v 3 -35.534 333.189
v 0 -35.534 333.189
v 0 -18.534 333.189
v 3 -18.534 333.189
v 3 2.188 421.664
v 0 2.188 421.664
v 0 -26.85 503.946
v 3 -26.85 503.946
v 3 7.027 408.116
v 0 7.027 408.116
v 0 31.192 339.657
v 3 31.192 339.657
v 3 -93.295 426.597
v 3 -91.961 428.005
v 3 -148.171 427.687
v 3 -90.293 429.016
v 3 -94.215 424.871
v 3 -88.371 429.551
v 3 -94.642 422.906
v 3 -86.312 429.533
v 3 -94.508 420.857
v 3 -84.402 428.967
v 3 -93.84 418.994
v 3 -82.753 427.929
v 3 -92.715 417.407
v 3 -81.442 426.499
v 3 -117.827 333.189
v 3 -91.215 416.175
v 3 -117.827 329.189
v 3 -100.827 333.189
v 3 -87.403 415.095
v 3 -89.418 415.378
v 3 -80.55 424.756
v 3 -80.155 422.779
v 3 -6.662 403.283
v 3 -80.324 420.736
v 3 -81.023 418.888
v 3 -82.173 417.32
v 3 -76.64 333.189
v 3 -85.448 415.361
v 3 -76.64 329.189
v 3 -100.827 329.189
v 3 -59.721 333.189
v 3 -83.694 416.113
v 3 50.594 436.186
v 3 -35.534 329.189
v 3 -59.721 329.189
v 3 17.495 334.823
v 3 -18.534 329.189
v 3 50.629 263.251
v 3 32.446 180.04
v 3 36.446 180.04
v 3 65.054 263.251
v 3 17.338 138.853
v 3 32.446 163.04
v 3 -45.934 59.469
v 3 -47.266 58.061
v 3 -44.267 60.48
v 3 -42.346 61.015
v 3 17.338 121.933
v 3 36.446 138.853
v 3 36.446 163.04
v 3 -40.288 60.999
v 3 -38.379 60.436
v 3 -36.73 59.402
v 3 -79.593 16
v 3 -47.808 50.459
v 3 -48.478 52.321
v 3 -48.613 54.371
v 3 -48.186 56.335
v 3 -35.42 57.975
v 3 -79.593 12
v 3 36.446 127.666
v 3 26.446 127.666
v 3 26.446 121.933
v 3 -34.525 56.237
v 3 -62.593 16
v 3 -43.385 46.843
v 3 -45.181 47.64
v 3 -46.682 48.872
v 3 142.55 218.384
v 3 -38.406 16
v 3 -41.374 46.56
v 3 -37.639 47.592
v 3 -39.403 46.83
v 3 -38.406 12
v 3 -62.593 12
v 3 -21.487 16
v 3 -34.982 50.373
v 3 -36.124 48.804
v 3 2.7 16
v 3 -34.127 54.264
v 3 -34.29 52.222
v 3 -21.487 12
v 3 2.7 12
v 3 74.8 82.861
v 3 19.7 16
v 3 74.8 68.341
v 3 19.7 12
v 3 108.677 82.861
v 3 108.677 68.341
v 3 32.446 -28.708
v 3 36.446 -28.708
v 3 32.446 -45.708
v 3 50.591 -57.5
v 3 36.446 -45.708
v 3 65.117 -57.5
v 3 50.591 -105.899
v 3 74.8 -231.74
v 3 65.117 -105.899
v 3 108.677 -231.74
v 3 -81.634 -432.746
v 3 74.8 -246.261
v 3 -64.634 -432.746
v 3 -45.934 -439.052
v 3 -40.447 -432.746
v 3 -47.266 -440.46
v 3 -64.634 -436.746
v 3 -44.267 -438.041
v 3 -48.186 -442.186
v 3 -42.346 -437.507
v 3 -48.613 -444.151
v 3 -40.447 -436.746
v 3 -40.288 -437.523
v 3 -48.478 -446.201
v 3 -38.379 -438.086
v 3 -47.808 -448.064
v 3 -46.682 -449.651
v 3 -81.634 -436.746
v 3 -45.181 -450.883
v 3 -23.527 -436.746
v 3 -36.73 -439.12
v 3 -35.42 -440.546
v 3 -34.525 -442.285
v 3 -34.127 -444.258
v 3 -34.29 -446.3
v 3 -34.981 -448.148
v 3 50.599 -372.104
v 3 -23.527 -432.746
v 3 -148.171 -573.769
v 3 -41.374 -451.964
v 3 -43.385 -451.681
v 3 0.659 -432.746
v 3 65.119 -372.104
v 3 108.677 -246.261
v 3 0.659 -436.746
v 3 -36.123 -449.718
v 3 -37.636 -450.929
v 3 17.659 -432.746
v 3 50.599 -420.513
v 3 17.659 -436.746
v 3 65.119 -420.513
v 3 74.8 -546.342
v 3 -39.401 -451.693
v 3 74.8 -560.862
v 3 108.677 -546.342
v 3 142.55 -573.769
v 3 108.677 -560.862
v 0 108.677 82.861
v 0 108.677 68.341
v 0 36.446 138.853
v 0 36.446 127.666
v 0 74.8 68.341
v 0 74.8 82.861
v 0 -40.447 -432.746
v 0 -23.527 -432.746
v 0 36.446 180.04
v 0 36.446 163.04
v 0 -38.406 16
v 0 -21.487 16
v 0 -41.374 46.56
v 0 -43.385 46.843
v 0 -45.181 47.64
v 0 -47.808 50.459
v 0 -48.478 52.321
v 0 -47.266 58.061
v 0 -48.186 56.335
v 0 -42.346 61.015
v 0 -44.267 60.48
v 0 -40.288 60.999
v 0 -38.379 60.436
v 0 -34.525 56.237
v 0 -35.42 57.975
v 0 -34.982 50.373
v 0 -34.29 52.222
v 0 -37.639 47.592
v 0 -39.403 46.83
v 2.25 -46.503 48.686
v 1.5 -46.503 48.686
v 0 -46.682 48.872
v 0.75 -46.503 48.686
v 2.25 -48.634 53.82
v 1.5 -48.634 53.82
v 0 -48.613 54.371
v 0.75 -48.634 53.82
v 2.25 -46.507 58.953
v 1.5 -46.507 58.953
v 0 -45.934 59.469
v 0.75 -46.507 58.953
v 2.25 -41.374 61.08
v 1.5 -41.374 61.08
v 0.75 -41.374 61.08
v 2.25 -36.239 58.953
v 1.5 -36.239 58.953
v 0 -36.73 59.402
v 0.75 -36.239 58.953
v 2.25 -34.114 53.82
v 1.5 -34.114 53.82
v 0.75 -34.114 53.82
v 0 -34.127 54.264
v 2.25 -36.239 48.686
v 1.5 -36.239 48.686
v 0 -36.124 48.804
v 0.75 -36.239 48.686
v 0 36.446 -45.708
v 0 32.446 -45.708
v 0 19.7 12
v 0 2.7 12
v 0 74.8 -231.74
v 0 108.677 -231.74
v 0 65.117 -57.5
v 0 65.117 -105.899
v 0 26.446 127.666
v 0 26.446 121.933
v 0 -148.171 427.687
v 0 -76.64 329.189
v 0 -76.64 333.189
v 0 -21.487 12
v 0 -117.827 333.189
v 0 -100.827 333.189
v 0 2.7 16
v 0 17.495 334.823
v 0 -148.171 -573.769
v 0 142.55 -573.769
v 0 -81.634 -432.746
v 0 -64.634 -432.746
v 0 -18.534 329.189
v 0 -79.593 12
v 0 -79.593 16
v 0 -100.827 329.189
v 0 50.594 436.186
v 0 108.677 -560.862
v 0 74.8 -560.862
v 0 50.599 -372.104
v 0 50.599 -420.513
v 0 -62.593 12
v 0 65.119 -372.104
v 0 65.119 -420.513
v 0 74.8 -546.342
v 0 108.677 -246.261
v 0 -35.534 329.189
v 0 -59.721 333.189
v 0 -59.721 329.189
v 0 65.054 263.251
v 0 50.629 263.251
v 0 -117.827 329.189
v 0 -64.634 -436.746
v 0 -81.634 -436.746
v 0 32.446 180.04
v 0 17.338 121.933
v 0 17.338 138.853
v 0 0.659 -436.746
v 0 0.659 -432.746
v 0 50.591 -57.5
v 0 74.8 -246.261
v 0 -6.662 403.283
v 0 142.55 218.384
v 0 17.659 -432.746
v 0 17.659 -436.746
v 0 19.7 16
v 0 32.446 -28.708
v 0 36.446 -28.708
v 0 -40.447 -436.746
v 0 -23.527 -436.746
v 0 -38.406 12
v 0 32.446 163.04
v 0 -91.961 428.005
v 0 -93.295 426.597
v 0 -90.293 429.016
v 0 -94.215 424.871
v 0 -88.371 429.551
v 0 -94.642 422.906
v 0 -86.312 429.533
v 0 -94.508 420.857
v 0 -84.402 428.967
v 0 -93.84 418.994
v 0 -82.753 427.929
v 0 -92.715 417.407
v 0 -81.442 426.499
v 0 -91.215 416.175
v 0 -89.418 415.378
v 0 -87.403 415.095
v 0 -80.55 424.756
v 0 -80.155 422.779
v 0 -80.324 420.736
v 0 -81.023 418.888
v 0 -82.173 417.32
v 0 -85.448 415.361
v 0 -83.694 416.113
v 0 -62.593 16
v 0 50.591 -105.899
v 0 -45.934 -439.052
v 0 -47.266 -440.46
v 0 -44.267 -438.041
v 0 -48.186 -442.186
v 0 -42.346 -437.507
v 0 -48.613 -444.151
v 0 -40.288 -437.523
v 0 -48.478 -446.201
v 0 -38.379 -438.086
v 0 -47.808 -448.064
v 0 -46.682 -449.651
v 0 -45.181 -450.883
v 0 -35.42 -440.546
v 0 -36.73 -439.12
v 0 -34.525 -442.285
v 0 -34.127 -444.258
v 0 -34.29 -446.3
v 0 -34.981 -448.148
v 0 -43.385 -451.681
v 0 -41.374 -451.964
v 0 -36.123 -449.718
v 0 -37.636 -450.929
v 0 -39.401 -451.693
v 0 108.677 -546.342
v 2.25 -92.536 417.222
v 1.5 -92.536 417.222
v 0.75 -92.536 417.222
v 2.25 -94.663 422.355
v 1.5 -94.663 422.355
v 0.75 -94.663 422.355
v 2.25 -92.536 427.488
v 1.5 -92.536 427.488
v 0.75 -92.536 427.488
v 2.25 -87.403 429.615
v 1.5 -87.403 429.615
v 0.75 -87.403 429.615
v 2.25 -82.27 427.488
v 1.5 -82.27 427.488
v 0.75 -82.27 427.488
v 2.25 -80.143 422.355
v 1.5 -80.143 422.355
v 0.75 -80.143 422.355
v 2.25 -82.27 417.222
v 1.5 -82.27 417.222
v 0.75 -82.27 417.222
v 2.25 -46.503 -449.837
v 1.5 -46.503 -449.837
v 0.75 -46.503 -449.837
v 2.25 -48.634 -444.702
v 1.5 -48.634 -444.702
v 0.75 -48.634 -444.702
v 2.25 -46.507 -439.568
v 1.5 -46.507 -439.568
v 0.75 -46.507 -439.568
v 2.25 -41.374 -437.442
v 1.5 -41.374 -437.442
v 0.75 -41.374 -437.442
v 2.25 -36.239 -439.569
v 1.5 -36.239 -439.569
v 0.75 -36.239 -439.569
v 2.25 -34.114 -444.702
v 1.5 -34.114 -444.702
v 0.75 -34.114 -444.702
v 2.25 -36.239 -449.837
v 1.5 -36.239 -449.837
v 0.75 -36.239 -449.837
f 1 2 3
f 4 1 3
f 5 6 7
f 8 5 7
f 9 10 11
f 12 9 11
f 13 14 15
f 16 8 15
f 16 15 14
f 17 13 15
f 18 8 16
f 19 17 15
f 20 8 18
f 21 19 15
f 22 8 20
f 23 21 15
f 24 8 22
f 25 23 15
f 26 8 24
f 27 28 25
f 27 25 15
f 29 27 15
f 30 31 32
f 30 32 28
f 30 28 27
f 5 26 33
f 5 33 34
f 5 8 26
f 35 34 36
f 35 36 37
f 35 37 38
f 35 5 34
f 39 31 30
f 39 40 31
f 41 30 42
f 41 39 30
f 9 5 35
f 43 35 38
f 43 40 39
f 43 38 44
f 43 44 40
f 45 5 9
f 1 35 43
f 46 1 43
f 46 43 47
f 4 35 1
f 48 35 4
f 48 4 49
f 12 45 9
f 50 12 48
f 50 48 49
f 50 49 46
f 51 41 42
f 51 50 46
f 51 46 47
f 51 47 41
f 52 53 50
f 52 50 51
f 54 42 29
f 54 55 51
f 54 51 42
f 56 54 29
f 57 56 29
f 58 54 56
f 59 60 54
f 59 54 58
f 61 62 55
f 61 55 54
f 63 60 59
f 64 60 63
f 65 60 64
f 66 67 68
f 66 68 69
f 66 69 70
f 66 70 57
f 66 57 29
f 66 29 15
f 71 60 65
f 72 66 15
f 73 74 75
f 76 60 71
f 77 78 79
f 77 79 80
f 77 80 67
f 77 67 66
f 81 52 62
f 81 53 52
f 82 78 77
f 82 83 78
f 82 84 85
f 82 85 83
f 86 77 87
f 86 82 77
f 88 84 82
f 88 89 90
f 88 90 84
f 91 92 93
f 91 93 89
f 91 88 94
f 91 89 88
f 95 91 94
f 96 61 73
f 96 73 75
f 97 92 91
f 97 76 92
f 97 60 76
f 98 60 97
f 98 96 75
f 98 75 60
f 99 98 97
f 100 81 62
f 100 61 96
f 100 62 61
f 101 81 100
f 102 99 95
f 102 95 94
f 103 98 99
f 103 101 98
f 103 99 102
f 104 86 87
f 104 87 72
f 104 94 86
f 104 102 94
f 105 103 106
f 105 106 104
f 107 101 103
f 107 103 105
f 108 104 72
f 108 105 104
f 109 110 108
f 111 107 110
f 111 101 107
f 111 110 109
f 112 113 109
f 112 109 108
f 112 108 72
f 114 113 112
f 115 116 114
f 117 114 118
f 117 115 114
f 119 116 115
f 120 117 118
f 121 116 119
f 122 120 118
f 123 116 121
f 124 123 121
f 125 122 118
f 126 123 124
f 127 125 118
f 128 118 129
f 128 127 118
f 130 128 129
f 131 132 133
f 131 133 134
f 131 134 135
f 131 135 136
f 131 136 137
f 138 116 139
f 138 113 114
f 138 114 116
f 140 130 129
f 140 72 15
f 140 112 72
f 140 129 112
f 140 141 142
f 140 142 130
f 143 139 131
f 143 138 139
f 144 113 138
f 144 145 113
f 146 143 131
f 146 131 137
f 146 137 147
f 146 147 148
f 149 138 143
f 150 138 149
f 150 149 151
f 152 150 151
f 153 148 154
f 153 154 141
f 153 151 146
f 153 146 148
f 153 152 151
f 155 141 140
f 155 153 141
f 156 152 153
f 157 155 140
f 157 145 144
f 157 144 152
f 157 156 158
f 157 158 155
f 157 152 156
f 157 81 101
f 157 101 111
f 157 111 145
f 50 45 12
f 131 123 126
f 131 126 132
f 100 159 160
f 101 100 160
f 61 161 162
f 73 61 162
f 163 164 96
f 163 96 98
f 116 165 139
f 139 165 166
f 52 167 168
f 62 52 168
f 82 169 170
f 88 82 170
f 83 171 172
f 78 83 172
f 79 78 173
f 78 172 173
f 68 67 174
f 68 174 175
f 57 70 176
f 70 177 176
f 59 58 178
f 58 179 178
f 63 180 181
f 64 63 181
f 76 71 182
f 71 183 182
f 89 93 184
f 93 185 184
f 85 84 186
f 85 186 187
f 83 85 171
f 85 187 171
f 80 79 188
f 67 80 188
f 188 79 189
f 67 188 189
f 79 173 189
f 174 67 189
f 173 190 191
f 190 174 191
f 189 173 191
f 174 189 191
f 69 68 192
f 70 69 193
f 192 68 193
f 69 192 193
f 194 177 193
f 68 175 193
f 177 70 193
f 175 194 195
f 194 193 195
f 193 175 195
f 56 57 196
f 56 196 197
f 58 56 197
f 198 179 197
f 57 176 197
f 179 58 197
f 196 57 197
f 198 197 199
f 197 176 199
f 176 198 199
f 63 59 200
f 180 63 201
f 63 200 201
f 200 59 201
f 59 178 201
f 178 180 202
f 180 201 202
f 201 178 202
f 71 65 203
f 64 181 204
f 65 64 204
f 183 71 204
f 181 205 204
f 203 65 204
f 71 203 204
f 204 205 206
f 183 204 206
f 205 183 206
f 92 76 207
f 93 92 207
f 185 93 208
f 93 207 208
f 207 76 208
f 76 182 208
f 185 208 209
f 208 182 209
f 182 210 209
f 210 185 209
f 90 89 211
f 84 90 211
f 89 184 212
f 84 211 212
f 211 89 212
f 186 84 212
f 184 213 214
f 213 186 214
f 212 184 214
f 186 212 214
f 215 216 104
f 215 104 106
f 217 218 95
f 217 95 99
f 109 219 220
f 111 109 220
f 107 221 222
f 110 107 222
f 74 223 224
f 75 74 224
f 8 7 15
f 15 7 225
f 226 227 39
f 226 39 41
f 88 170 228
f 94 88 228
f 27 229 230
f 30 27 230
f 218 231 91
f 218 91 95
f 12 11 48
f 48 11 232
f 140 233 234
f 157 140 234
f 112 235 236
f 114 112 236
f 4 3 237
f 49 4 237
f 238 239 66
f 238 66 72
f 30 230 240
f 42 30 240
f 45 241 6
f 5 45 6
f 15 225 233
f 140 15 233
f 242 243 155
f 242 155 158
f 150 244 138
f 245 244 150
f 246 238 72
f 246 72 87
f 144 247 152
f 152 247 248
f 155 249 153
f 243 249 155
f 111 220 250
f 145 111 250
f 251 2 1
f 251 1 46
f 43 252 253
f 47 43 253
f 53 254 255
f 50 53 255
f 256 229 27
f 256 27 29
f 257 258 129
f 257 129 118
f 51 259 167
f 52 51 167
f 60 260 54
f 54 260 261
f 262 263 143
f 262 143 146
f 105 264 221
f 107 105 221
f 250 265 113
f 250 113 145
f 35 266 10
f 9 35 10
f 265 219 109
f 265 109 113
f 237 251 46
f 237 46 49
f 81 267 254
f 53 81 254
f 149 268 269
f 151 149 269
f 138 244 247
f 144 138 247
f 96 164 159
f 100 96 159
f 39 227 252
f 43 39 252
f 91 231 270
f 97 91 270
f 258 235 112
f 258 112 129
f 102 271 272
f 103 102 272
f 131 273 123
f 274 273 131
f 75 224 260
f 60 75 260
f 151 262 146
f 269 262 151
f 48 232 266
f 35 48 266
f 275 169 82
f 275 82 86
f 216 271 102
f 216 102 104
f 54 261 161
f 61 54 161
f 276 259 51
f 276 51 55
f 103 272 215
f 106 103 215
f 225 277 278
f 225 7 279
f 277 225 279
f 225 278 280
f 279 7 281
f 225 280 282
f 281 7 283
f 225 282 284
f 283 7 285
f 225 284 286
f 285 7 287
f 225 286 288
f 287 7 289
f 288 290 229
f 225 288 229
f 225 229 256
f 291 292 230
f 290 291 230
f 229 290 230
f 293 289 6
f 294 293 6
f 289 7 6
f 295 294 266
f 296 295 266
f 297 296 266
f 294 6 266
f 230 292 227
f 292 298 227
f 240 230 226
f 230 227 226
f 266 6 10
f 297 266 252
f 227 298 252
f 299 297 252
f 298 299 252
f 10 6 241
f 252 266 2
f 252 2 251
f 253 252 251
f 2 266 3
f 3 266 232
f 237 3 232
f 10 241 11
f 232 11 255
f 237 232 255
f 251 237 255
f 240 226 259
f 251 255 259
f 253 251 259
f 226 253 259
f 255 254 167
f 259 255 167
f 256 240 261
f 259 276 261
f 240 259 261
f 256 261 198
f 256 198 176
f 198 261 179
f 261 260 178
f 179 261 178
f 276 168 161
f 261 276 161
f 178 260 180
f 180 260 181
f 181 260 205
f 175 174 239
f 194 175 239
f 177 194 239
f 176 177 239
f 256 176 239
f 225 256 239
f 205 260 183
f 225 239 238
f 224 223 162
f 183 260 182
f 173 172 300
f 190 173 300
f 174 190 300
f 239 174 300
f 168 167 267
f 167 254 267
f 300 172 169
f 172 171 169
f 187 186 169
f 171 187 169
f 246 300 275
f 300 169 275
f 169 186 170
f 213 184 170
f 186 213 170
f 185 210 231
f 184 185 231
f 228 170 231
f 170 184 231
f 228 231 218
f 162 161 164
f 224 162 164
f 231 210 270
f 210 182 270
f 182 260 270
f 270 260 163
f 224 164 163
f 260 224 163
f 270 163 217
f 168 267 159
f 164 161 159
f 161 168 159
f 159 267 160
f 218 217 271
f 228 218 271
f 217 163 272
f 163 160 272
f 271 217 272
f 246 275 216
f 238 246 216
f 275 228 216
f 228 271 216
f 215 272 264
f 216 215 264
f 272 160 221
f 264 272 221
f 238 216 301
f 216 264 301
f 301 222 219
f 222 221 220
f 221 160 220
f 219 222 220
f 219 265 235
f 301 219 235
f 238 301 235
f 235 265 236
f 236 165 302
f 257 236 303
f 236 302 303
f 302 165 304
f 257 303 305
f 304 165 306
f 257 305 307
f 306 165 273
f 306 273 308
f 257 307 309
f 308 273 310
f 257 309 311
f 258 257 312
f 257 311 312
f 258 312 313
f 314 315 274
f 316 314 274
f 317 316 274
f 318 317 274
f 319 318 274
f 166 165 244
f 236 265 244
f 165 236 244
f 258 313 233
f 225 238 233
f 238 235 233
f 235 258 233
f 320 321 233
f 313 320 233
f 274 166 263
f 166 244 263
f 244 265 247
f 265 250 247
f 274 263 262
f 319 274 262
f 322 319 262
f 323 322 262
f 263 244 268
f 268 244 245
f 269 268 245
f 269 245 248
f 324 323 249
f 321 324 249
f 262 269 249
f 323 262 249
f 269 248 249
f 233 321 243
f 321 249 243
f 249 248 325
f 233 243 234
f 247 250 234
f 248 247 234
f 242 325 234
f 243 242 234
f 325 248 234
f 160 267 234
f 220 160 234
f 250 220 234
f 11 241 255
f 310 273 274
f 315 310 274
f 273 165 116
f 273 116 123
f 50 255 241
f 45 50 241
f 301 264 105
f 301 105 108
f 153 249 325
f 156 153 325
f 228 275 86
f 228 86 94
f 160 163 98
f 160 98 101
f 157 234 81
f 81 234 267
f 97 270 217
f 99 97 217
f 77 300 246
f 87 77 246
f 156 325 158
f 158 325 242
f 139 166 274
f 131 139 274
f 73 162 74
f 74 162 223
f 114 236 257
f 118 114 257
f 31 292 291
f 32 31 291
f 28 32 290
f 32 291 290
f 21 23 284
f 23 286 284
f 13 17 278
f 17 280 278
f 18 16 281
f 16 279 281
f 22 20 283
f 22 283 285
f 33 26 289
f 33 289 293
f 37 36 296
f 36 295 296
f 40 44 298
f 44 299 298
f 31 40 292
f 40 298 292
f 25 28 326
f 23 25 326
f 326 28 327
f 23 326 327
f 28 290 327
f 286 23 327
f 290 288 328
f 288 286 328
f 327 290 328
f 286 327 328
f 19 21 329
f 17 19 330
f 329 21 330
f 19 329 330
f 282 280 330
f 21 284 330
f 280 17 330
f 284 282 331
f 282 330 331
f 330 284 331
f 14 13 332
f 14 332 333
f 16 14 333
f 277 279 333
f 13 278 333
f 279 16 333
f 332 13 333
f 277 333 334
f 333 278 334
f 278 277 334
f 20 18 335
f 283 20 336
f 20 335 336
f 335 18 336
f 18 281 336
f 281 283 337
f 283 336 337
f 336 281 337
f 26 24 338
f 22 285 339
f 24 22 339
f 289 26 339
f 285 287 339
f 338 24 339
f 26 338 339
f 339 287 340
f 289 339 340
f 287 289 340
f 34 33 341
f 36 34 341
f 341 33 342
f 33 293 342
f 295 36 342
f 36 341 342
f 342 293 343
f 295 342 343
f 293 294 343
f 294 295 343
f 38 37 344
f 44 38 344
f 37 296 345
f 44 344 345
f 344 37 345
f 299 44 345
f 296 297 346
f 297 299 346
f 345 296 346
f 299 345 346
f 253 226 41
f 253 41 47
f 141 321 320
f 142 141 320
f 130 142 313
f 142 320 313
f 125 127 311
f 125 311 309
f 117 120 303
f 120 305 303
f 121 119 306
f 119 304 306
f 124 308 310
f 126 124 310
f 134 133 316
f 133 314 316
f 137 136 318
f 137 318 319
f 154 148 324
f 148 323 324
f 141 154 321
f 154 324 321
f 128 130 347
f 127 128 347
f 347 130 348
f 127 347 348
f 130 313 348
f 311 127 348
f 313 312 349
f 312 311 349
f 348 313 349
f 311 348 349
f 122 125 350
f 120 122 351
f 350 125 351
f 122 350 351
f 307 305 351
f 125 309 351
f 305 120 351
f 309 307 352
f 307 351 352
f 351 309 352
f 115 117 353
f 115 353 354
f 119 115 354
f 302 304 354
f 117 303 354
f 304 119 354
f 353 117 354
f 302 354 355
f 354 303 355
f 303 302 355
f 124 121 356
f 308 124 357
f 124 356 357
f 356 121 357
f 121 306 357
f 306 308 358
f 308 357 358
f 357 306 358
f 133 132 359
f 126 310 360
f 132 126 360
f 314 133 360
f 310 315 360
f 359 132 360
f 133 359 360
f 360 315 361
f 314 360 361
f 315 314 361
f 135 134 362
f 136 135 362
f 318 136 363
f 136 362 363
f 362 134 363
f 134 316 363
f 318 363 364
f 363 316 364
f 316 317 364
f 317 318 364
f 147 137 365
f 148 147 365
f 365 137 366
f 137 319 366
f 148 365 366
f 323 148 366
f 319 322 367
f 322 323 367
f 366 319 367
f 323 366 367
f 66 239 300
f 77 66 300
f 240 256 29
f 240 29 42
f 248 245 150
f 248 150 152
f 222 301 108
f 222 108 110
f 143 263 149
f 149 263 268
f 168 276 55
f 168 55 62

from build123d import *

# Parameters (mm, degrees)
SKETCH1_W           = 4
SKETCH1_H           = 17
SKETCH1_W_2         = 17
SKETCH1_H_2         = 4
SKETCH1_W_3         = 14.5201
SKETCH1_H_3         = 33.8773
SKETCH1_W_4         = 48.399
SKETCH1_H_4         = 14.5267
SKETCH1_W_5         = 48.409
SKETCH1_H_5         = 14.5201
SKETCH1_H_6         = 16.9197
SKETCH1_H_7         = 16.9198
BOSS_EXTRUDE2_DEPTH = 3


with BuildPart() as part:
    # Sketch1 → Boss-Extrude2 (new body)
    with BuildSketch(Plane(origin=(0, 0, 0), x_dir=(0, 0, -1), z_dir=(1, 0, 0))):
        Polygon((-503.9458, -26.8502), (-427.6871, -148.1709), (573.7687, -148.1709), (573.7687, 142.5497), (-218.3839, 142.5497), (-263.2513, 65.0539), (-263.2513, 50.6289), (-436.1861, 50.5939), (-421.6644, 2.1883), align=None)
        with Locations((434.7463, 9.1594)):
            Rectangle(SKETCH1_W, SKETCH1_H, mode=Mode.SUBTRACT)
        with Locations((37.2084, 34.4461)):
            Rectangle(SKETCH1_W_2, SKETCH1_H_2, mode=Mode.SUBTRACT)
        Polygon((-408.1165, 7.0272), (-339.6566, 31.1916), (-334.8227, 17.4953), (-403.2826, -6.6625), align=None, mode=Mode.SUBTRACT)
        with Locations((-75.60135, 91.73875)):
            Rectangle(SKETCH1_W_3, SKETCH1_H_3, mode=Mode.SUBTRACT)
        with Locations((81.6996, 57.85395)):
            Rectangle(SKETCH1_W_4, SKETCH1_H_4, mode=Mode.SUBTRACT)
        with Locations((239.00055, 91.73875)):
            Rectangle(SKETCH1_W_3, SKETCH1_H_3, mode=Mode.SUBTRACT)
        with Locations((396.3082, 57.85895)):
            Rectangle(SKETCH1_W_5, SKETCH1_H_5, mode=Mode.SUBTRACT)
        with Locations((553.60245, 91.73875)):
            Rectangle(SKETCH1_W_3, SKETCH1_H_3, mode=Mode.SUBTRACT)
        with Locations((-331.1886, -27.0339)):
            Rectangle(SKETCH1_W, SKETCH1_H, mode=Mode.SUBTRACT)
        with Locations((-331.1886, -68.18055)):
            Rectangle(SKETCH1_W, SKETCH1_H_6, mode=Mode.SUBTRACT)
        with Locations((-331.1886, -109.3272)):
            Rectangle(SKETCH1_W, SKETCH1_H, mode=Mode.SUBTRACT)
        with Locations((-171.5395, 34.4461)):
            Rectangle(SKETCH1_W_2, SKETCH1_H_2, mode=Mode.SUBTRACT)
        Polygon((-127.6656, 36.4461), (-127.6656, 26.4461), (-121.933, 26.4461), (-121.933, 17.3384), (-138.8528, 17.3384), (-138.8528, 36.4461), align=None, mode=Mode.SUBTRACT)
        with Locations((-14, 11.2)):
            Rectangle(SKETCH1_W, SKETCH1_H, mode=Mode.SUBTRACT)
        with Locations((-14, -29.9466)):
            Rectangle(SKETCH1_W, SKETCH1_H_7, mode=Mode.SUBTRACT)
        with Locations((-14, -71.0932)):
            Rectangle(SKETCH1_W, SKETCH1_H, mode=Mode.SUBTRACT)
        with Locations((434.7463, -31.9872)):
            Rectangle(SKETCH1_W, SKETCH1_H_7, mode=Mode.SUBTRACT)
        with Locations((434.7463, -73.1338)):
            Rectangle(SKETCH1_W, SKETCH1_H, mode=Mode.SUBTRACT)
        with BuildLine():
            add(Edge.make_bspline(
                [(444.7022, -48.6335), (440.6903, -48.6335), (437.4421, -45.382), (437.4421, -41.3735)],
                knots=[0, 0, 0, 0, 0.333333333, 0.333333333, 0.333333333, 0.333333333], degree=3))
            add(Edge.make_bspline(
                [(437.4421, -41.3735), (437.4421, -37.3617), (440.6937, -34.1135), (444.7022, -34.1135)],
                knots=[0.333333333, 0.333333333, 0.333333333, 0.333333333, 1, 1, 1, 1], degree=3))
            add(Edge.make_bspline(
                [(444.7022, -34.1135), (448.7124, -34.1135), (451.9639, -37.3617), (451.9639, -41.3735)],
                knots=[0, 0, 0, 0, 0.333333333, 0.333333333, 0.333333333, 0.333333333], degree=3))
            add(Edge.make_bspline(
                [(451.9639, -41.3735), (451.9639, -45.372), (448.7124, -48.6335), (444.7022, -48.6335)],
                knots=[0.333333333, 0.333333333, 0.333333333, 0.333333333, 1, 1, 1, 1], degree=3))
        make_face(mode=Mode.SUBTRACT)
        with BuildLine():
            add(Edge.make_bspline(
                [(-53.8196, -48.6335), (-57.8298, -48.6335), (-61.0797, -45.382), (-61.0797, -41.3735)],
                knots=[0, 0, 0, 0, 0.333333333, 0.333333333, 0.333333333, 0.333333333], degree=3))
            add(Edge.make_bspline(
                [(-61.0797, -41.3735), (-61.0797, -37.3617), (-57.8282, -34.1135), (-53.8196, -34.1135)],
                knots=[0.333333333, 0.333333333, 0.333333333, 0.333333333, 1, 1, 1, 1], degree=3))
            add(Edge.make_bspline(
                [(-53.8196, -34.1135), (-49.8111, -34.1135), (-46.5596, -37.3617), (-46.5596, -41.3735)],
                knots=[0, 0, 0, 0, 0.333333333, 0.333333333, 0.333333333, 0.333333333], degree=3))
            add(Edge.make_bspline(
                [(-46.5596, -41.3735), (-46.5596, -45.372), (-49.8111, -48.6335), (-53.8196, -48.6335)],
                knots=[0.333333333, 0.333333333, 0.333333333, 0.333333333, 1, 1, 1, 1], degree=3))
        make_face(mode=Mode.SUBTRACT)
        with BuildLine():
            add(Edge.make_bspline(
                [(-422.3548, -94.6631), (-426.3633, -94.6631), (-429.6148, -91.4116), (-429.6148, -87.4031)],
                knots=[0, 0, 0, 0, 0.333333333, 0.333333333, 0.333333333, 0.333333333], degree=3))
            add(Edge.make_bspline(
                [(-429.6148, -87.4031), (-429.6148, -83.3946), (-426.3633, -80.1431), (-422.3548, -80.1431)],
                knots=[0.333333333, 0.333333333, 0.333333333, 0.333333333, 1, 1, 1, 1], degree=3))
            add(Edge.make_bspline(
                [(-422.3548, -80.1431), (-418.3462, -80.1431), (-415.0947, -83.3946), (-415.0947, -87.4031)],
                knots=[0, 0, 0, 0, 0.333333333, 0.333333333, 0.333333333, 0.333333333], degree=3))
            add(Edge.make_bspline(
                [(-415.0947, -87.4031), (-415.0947, -91.4116), (-418.3462, -94.6631), (-422.3548, -94.6631)],
                knots=[0.333333333, 0.333333333, 0.333333333, 0.333333333, 1, 1, 1, 1], degree=3))
        make_face(mode=Mode.SUBTRACT)
    extrude(amount=BOSS_EXTRUDE2_DEPTH)


solid = part.part
